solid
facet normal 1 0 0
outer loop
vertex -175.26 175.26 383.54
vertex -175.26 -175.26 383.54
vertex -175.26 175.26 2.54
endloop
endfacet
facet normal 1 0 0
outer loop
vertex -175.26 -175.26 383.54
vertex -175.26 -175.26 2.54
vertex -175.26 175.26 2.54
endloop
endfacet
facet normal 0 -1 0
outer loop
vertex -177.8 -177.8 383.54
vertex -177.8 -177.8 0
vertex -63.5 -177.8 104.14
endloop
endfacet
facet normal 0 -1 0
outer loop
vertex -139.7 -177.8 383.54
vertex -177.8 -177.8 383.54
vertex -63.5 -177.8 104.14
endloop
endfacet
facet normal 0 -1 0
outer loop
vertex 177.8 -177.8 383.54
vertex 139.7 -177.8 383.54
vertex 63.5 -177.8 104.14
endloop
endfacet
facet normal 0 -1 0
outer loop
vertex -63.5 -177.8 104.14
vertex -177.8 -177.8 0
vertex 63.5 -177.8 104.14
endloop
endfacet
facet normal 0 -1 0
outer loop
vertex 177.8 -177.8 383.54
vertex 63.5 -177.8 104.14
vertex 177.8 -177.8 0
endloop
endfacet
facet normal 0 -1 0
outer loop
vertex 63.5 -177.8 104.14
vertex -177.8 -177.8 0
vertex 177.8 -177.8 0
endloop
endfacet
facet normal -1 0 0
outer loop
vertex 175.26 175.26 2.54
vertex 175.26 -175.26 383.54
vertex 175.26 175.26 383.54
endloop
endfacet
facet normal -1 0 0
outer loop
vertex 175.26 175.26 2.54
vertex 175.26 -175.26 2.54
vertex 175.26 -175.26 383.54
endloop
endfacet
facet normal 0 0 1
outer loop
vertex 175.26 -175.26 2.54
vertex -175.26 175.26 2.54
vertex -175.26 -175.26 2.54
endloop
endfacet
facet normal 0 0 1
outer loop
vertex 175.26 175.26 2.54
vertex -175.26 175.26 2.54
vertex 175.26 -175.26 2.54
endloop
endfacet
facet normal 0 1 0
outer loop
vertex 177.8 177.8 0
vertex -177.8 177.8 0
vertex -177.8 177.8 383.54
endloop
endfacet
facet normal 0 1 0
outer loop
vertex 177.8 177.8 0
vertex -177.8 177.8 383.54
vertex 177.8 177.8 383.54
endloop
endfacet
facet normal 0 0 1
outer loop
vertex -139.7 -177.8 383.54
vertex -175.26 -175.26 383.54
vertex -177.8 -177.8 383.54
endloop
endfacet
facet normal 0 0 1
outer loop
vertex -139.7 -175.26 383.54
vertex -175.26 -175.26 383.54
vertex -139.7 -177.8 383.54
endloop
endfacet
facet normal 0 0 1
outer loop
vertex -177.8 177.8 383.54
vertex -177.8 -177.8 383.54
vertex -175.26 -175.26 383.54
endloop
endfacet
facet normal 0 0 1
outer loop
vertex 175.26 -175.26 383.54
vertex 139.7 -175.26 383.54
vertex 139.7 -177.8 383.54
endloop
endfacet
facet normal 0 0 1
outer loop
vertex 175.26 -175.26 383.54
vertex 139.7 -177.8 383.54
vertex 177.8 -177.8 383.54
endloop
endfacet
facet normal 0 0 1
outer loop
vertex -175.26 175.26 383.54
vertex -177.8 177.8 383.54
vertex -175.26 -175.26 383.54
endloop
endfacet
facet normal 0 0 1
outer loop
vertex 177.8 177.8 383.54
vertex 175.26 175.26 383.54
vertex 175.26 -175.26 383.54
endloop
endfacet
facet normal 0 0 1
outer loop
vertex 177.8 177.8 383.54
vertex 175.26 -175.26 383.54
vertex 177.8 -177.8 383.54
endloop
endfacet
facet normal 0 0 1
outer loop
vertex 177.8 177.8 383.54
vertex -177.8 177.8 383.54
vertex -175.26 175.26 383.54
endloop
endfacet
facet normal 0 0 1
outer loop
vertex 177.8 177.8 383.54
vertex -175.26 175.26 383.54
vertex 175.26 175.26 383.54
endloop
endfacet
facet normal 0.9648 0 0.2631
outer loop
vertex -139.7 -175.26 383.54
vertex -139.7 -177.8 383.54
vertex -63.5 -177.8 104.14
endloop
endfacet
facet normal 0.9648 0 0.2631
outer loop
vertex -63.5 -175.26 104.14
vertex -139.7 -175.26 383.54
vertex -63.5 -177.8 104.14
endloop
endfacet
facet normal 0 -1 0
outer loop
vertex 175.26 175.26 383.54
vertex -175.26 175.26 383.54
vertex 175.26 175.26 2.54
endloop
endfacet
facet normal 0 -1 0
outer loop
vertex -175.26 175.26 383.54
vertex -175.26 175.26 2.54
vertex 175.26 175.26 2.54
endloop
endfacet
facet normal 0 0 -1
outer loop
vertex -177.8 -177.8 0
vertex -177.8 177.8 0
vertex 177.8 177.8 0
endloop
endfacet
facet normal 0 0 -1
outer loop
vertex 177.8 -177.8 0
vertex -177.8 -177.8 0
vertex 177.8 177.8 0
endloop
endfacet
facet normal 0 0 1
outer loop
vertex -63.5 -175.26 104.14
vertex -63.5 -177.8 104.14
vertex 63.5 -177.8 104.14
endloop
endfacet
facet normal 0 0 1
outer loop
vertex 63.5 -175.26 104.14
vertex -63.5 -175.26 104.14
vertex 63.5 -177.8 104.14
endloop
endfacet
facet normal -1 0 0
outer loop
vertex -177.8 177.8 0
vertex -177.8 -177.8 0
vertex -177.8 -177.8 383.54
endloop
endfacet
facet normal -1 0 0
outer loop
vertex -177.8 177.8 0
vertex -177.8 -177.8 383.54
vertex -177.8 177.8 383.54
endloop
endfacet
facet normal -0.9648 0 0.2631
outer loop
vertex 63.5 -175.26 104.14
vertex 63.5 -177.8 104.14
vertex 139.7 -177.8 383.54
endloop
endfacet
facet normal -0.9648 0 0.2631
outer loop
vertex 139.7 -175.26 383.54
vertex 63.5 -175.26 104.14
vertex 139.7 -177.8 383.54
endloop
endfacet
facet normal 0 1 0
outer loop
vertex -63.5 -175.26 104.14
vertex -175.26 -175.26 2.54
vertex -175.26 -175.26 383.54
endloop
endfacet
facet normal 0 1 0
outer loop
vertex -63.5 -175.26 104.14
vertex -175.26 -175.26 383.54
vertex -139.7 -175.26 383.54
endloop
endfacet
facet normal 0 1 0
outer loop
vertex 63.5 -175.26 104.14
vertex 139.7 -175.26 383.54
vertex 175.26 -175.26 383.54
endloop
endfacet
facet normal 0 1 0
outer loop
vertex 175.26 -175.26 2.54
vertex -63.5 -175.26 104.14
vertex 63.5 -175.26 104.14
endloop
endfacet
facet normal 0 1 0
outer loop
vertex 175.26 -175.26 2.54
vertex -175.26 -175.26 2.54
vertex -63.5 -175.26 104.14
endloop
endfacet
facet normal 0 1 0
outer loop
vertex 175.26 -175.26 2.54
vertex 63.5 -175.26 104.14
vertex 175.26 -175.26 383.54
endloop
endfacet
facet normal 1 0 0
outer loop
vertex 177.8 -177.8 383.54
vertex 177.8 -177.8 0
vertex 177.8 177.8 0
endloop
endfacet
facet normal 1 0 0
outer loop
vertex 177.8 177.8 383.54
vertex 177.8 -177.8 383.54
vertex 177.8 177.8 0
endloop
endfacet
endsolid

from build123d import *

# Parameters (mm, degrees)
F0_W     = 355.6
F0_H     = 355.6
F1_DEPTH = 383.54
F2_T     = -2.54
F4_DEPTH = 25.4


with BuildPart() as f1:
    # F0 (on Top) → F1 (new body)
    with BuildSketch(Plane.XY):
        Rectangle(F0_W, F0_H)
    extrude(amount=F1_DEPTH)

    # F2
    f2_openings = [f1.faces().sort_by_distance(p)[0] for p in [
        (0, 0, 383.54),
    ]]
    offset(amount=F2_T, openings=f2_openings)

    # F3 (on face) → F4 (cut)
    with BuildSketch(Plane.XZ.offset(177.8)):
        Polygon((139.7, 383.54), (-139.7, 383.54), (-63.5, 104.14), (63.5, 104.14), align=None)
    extrude(amount=-F4_DEPTH, mode=Mode.SUBTRACT)


solid = f1.part
